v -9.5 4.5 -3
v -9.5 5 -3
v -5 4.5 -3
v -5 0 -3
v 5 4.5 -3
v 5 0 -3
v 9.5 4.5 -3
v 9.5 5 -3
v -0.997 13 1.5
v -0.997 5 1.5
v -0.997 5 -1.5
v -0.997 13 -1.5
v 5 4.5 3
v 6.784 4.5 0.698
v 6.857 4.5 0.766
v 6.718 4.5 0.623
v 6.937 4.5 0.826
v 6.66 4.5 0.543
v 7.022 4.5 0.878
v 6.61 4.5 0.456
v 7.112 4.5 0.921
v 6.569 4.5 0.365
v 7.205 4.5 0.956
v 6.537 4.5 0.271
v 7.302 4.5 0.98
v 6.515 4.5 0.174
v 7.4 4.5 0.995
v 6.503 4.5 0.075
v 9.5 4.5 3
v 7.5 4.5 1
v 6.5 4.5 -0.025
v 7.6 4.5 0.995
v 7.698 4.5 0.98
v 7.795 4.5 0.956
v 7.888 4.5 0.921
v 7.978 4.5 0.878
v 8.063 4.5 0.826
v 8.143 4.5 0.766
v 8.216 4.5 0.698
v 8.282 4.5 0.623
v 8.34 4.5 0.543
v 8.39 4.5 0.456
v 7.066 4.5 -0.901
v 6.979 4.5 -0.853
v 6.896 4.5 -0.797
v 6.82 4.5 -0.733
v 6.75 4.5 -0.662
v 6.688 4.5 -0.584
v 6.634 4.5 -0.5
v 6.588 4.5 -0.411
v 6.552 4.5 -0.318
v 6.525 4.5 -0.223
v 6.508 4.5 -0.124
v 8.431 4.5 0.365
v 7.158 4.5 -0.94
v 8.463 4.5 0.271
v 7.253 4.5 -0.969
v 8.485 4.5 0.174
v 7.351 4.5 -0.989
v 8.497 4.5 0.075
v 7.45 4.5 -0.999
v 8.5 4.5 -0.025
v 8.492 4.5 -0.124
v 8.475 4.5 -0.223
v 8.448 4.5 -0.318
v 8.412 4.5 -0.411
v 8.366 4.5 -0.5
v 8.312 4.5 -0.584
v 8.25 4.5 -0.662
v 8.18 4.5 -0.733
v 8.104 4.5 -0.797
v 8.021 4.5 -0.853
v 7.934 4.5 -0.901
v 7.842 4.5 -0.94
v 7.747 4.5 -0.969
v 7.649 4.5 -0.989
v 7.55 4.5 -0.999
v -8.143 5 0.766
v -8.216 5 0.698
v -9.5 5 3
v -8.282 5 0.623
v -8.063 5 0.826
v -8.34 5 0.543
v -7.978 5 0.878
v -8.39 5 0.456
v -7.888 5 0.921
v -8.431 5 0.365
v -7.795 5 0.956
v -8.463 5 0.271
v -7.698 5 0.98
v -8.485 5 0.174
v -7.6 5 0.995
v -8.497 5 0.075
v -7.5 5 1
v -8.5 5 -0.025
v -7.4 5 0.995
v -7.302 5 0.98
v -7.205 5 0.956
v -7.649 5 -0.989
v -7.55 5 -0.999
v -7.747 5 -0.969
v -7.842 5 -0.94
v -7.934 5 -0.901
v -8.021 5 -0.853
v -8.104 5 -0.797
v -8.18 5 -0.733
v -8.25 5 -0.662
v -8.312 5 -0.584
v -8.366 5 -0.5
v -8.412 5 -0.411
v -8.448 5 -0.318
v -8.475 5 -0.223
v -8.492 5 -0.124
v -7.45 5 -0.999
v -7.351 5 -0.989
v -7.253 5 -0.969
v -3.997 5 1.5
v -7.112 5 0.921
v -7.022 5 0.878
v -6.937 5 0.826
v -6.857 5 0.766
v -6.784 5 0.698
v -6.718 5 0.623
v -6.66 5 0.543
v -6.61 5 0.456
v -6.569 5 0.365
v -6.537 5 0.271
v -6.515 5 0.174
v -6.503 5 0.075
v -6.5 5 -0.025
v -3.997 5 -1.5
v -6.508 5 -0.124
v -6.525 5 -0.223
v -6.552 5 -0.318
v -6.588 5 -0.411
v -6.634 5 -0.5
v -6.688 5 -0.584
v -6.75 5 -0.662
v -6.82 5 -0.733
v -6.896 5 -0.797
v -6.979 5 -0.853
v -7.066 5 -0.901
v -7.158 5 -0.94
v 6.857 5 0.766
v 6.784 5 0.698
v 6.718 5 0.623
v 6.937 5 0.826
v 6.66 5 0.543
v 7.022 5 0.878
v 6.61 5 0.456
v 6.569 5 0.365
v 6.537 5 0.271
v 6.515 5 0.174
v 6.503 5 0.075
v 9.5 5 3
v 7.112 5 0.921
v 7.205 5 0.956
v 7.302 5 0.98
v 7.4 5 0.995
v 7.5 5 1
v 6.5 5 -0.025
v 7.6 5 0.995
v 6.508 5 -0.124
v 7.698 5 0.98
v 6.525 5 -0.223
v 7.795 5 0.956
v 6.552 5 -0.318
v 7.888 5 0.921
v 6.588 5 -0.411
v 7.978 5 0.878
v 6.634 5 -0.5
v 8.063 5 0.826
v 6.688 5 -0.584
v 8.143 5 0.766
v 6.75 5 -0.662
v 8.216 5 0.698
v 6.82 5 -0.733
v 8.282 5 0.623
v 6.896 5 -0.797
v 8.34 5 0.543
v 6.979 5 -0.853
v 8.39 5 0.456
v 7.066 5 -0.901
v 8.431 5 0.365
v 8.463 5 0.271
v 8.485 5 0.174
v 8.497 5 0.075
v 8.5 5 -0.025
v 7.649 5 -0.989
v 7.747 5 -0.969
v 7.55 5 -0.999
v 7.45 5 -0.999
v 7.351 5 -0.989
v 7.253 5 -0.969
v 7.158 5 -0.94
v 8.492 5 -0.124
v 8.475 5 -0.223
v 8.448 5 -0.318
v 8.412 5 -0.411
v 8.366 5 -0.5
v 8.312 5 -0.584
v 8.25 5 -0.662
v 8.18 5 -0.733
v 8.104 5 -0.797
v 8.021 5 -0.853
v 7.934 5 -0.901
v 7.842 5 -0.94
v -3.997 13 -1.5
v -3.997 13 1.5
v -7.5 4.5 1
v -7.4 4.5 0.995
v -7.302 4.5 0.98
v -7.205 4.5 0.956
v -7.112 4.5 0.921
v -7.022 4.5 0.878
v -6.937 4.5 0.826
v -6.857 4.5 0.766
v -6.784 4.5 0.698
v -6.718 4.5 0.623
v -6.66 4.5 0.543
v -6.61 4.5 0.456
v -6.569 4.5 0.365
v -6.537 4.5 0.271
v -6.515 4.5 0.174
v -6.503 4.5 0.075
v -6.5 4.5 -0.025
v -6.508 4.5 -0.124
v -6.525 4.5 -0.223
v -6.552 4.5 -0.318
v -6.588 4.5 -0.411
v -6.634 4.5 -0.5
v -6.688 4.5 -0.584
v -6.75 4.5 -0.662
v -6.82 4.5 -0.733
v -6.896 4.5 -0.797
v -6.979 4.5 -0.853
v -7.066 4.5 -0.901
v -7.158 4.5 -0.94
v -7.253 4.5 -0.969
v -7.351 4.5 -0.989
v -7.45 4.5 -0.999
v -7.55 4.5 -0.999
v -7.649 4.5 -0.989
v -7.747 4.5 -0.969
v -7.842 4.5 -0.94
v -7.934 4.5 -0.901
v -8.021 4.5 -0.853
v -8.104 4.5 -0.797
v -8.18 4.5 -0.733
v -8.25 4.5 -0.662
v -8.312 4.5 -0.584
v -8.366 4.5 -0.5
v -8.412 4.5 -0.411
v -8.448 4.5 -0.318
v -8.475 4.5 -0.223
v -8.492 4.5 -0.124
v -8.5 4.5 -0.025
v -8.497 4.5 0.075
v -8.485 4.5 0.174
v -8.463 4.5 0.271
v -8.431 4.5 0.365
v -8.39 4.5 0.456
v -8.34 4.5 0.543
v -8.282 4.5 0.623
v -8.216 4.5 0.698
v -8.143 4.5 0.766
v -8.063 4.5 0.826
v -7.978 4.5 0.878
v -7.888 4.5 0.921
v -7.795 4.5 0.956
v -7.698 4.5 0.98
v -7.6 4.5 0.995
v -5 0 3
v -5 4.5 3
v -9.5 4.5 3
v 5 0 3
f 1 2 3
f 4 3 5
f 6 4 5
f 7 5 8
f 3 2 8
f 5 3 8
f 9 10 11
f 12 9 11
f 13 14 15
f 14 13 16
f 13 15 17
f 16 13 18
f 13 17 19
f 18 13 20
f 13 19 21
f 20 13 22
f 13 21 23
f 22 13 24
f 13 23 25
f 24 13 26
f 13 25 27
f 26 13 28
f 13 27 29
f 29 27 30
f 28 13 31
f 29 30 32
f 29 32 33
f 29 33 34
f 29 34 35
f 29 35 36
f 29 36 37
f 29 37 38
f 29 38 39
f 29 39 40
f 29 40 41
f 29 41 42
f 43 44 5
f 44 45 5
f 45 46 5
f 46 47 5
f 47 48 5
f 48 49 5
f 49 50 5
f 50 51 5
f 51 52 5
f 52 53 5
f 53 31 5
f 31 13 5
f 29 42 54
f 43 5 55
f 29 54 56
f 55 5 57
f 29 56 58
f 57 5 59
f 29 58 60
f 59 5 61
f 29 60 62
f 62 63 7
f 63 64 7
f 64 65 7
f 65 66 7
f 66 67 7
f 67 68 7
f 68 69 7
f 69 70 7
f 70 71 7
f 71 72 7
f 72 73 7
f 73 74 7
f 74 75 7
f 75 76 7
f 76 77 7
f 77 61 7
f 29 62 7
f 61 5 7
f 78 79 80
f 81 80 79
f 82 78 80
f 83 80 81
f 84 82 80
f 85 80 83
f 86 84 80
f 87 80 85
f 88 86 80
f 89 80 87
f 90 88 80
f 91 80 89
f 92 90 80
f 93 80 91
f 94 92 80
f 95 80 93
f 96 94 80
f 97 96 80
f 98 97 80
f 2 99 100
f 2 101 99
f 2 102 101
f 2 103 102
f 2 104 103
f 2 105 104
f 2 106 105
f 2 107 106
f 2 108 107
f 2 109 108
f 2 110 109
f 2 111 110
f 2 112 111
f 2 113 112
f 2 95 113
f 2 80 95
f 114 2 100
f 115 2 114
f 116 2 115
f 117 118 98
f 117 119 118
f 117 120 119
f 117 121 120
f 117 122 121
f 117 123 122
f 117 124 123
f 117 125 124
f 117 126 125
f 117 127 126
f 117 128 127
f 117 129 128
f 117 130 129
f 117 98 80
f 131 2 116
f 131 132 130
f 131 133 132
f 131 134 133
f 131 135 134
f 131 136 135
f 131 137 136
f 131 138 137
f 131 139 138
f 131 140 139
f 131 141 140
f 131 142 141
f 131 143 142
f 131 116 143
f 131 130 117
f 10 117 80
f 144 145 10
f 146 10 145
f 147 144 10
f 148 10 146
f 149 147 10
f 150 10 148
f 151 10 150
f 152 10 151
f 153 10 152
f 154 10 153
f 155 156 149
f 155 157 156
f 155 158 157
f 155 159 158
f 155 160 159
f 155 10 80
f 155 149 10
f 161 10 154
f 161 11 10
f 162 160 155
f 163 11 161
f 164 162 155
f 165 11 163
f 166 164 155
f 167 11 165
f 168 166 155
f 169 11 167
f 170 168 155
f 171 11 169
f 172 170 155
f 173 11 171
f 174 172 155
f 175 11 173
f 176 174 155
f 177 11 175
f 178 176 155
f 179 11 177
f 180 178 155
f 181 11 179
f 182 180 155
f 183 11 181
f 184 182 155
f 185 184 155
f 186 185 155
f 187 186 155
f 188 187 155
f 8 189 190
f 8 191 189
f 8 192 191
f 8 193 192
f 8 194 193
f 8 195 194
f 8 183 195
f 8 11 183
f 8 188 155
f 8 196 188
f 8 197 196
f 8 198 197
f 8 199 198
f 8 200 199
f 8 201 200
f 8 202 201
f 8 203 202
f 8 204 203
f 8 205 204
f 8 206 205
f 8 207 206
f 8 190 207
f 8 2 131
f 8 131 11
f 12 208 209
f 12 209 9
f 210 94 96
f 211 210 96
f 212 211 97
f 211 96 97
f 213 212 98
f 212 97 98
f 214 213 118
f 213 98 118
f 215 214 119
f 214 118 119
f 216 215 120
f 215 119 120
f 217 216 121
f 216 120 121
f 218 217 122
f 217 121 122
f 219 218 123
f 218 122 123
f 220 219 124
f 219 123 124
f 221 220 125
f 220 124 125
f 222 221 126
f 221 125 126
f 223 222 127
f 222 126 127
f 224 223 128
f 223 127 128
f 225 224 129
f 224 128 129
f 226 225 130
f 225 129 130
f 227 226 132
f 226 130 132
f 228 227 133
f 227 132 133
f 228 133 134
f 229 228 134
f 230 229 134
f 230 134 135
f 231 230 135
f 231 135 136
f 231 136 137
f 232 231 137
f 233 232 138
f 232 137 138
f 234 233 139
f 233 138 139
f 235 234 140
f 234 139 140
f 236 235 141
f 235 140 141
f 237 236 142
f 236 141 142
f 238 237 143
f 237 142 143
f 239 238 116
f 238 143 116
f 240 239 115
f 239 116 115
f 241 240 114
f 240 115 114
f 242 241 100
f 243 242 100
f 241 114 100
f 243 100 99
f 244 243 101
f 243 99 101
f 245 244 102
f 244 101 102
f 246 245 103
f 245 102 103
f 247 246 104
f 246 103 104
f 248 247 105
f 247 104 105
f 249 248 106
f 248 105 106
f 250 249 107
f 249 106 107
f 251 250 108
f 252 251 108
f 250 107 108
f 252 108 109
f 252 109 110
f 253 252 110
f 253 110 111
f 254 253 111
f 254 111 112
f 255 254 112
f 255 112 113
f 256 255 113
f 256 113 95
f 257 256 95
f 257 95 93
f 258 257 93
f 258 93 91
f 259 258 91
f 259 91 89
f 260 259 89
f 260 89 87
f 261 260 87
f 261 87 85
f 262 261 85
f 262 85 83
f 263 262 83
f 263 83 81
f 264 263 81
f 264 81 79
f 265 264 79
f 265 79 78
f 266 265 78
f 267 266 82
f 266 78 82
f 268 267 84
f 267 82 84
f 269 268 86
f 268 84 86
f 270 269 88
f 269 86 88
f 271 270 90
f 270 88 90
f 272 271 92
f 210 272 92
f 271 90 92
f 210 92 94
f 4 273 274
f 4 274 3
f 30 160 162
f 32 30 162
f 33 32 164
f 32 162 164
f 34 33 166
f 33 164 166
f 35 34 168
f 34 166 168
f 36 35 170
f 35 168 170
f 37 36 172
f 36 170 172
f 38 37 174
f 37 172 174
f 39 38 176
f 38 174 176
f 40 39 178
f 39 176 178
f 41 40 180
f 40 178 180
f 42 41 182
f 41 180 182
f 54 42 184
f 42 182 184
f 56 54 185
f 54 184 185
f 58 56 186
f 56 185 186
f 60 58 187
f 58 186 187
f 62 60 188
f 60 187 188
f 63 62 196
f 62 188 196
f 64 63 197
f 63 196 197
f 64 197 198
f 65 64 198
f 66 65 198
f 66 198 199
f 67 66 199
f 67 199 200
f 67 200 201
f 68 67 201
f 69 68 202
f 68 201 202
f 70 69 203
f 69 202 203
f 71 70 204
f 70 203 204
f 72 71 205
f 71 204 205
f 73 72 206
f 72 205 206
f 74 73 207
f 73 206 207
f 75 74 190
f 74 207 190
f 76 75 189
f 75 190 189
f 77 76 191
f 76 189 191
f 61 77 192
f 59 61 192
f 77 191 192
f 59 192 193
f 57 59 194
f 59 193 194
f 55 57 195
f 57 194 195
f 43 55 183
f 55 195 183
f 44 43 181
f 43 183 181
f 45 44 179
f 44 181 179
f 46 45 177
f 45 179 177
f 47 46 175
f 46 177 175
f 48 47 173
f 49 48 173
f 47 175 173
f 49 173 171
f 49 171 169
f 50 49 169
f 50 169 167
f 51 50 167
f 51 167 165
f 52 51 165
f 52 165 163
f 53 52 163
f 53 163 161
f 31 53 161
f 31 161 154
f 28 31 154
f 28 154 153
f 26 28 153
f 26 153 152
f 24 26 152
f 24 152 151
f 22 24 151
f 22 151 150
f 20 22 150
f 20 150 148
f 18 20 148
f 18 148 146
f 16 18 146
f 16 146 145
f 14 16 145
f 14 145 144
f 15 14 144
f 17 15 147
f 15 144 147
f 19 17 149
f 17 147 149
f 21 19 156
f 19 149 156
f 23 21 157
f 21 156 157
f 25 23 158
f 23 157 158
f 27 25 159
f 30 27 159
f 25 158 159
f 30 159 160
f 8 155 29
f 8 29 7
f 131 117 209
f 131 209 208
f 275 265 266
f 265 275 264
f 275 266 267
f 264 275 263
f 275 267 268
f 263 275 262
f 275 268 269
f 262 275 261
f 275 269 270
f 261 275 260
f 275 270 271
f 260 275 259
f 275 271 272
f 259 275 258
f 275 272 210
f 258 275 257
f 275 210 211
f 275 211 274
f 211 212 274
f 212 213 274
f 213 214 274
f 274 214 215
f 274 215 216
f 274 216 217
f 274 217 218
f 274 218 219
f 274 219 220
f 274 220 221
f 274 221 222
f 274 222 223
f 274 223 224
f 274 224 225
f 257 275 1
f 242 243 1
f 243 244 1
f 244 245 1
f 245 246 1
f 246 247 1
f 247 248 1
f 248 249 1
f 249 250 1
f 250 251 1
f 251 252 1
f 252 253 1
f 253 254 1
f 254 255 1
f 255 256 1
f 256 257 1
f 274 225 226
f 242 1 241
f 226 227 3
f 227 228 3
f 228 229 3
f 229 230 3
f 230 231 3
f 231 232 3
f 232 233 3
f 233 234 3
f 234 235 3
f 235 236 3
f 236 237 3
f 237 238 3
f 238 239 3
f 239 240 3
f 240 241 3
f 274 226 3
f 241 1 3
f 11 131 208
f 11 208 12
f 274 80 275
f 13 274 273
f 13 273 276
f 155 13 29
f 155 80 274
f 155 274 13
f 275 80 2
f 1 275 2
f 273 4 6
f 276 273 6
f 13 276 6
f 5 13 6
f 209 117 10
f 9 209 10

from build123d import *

# Parameters (mm, degrees)
SKETCH1_W           = 10
SKETCH1_H           = 6
BOSS_EXTRUDE1_DEPTH = 5
SKETCH2_W           = 19
SKETCH2_H           = 6
SKETCH2_R           = 1
BOSS_EXTRUDE2_DEPTH = 0.5
SKETCH3_W           = 3
SKETCH3_H           = 3
BOSS_EXTRUDE3_DEPTH = 8


with BuildPart() as part:
    # Sketch1 → Boss-Extrude1 (new body)
    with BuildSketch(Plane(origin=(0, 0, 0), x_dir=(1, 0, 0), z_dir=(0, 1, 0))):
        Rectangle(SKETCH1_W, SKETCH1_H)
    extrude(amount=BOSS_EXTRUDE1_DEPTH)

    # Sketch2 → Boss-Extrude2 (add)
    with BuildSketch(Plane(origin=(0, 5, 0), x_dir=(1, 0, 0), z_dir=(0, 1, 0))):
        Rectangle(SKETCH2_W, SKETCH2_H)
        with Locations(Location((-7.5, 0, 0), (0, 0, 270))):
            Circle(SKETCH2_R, mode=Mode.SUBTRACT)
        with Locations(Location((7.5, 0, 0), (0, 0, 270))):
            Circle(SKETCH2_R, mode=Mode.SUBTRACT)
    extrude(amount=-BOSS_EXTRUDE2_DEPTH)

    # Sketch3 → Boss-Extrude3 (add)
    with BuildSketch(Plane(origin=(0, 5, 0), x_dir=(1, 0, 0), z_dir=(0, 1, 0))):
        with Locations((-2.497009228, 0)):
            Rectangle(SKETCH3_W, SKETCH3_H)
    extrude(amount=BOSS_EXTRUDE3_DEPTH)


solid = part.part
